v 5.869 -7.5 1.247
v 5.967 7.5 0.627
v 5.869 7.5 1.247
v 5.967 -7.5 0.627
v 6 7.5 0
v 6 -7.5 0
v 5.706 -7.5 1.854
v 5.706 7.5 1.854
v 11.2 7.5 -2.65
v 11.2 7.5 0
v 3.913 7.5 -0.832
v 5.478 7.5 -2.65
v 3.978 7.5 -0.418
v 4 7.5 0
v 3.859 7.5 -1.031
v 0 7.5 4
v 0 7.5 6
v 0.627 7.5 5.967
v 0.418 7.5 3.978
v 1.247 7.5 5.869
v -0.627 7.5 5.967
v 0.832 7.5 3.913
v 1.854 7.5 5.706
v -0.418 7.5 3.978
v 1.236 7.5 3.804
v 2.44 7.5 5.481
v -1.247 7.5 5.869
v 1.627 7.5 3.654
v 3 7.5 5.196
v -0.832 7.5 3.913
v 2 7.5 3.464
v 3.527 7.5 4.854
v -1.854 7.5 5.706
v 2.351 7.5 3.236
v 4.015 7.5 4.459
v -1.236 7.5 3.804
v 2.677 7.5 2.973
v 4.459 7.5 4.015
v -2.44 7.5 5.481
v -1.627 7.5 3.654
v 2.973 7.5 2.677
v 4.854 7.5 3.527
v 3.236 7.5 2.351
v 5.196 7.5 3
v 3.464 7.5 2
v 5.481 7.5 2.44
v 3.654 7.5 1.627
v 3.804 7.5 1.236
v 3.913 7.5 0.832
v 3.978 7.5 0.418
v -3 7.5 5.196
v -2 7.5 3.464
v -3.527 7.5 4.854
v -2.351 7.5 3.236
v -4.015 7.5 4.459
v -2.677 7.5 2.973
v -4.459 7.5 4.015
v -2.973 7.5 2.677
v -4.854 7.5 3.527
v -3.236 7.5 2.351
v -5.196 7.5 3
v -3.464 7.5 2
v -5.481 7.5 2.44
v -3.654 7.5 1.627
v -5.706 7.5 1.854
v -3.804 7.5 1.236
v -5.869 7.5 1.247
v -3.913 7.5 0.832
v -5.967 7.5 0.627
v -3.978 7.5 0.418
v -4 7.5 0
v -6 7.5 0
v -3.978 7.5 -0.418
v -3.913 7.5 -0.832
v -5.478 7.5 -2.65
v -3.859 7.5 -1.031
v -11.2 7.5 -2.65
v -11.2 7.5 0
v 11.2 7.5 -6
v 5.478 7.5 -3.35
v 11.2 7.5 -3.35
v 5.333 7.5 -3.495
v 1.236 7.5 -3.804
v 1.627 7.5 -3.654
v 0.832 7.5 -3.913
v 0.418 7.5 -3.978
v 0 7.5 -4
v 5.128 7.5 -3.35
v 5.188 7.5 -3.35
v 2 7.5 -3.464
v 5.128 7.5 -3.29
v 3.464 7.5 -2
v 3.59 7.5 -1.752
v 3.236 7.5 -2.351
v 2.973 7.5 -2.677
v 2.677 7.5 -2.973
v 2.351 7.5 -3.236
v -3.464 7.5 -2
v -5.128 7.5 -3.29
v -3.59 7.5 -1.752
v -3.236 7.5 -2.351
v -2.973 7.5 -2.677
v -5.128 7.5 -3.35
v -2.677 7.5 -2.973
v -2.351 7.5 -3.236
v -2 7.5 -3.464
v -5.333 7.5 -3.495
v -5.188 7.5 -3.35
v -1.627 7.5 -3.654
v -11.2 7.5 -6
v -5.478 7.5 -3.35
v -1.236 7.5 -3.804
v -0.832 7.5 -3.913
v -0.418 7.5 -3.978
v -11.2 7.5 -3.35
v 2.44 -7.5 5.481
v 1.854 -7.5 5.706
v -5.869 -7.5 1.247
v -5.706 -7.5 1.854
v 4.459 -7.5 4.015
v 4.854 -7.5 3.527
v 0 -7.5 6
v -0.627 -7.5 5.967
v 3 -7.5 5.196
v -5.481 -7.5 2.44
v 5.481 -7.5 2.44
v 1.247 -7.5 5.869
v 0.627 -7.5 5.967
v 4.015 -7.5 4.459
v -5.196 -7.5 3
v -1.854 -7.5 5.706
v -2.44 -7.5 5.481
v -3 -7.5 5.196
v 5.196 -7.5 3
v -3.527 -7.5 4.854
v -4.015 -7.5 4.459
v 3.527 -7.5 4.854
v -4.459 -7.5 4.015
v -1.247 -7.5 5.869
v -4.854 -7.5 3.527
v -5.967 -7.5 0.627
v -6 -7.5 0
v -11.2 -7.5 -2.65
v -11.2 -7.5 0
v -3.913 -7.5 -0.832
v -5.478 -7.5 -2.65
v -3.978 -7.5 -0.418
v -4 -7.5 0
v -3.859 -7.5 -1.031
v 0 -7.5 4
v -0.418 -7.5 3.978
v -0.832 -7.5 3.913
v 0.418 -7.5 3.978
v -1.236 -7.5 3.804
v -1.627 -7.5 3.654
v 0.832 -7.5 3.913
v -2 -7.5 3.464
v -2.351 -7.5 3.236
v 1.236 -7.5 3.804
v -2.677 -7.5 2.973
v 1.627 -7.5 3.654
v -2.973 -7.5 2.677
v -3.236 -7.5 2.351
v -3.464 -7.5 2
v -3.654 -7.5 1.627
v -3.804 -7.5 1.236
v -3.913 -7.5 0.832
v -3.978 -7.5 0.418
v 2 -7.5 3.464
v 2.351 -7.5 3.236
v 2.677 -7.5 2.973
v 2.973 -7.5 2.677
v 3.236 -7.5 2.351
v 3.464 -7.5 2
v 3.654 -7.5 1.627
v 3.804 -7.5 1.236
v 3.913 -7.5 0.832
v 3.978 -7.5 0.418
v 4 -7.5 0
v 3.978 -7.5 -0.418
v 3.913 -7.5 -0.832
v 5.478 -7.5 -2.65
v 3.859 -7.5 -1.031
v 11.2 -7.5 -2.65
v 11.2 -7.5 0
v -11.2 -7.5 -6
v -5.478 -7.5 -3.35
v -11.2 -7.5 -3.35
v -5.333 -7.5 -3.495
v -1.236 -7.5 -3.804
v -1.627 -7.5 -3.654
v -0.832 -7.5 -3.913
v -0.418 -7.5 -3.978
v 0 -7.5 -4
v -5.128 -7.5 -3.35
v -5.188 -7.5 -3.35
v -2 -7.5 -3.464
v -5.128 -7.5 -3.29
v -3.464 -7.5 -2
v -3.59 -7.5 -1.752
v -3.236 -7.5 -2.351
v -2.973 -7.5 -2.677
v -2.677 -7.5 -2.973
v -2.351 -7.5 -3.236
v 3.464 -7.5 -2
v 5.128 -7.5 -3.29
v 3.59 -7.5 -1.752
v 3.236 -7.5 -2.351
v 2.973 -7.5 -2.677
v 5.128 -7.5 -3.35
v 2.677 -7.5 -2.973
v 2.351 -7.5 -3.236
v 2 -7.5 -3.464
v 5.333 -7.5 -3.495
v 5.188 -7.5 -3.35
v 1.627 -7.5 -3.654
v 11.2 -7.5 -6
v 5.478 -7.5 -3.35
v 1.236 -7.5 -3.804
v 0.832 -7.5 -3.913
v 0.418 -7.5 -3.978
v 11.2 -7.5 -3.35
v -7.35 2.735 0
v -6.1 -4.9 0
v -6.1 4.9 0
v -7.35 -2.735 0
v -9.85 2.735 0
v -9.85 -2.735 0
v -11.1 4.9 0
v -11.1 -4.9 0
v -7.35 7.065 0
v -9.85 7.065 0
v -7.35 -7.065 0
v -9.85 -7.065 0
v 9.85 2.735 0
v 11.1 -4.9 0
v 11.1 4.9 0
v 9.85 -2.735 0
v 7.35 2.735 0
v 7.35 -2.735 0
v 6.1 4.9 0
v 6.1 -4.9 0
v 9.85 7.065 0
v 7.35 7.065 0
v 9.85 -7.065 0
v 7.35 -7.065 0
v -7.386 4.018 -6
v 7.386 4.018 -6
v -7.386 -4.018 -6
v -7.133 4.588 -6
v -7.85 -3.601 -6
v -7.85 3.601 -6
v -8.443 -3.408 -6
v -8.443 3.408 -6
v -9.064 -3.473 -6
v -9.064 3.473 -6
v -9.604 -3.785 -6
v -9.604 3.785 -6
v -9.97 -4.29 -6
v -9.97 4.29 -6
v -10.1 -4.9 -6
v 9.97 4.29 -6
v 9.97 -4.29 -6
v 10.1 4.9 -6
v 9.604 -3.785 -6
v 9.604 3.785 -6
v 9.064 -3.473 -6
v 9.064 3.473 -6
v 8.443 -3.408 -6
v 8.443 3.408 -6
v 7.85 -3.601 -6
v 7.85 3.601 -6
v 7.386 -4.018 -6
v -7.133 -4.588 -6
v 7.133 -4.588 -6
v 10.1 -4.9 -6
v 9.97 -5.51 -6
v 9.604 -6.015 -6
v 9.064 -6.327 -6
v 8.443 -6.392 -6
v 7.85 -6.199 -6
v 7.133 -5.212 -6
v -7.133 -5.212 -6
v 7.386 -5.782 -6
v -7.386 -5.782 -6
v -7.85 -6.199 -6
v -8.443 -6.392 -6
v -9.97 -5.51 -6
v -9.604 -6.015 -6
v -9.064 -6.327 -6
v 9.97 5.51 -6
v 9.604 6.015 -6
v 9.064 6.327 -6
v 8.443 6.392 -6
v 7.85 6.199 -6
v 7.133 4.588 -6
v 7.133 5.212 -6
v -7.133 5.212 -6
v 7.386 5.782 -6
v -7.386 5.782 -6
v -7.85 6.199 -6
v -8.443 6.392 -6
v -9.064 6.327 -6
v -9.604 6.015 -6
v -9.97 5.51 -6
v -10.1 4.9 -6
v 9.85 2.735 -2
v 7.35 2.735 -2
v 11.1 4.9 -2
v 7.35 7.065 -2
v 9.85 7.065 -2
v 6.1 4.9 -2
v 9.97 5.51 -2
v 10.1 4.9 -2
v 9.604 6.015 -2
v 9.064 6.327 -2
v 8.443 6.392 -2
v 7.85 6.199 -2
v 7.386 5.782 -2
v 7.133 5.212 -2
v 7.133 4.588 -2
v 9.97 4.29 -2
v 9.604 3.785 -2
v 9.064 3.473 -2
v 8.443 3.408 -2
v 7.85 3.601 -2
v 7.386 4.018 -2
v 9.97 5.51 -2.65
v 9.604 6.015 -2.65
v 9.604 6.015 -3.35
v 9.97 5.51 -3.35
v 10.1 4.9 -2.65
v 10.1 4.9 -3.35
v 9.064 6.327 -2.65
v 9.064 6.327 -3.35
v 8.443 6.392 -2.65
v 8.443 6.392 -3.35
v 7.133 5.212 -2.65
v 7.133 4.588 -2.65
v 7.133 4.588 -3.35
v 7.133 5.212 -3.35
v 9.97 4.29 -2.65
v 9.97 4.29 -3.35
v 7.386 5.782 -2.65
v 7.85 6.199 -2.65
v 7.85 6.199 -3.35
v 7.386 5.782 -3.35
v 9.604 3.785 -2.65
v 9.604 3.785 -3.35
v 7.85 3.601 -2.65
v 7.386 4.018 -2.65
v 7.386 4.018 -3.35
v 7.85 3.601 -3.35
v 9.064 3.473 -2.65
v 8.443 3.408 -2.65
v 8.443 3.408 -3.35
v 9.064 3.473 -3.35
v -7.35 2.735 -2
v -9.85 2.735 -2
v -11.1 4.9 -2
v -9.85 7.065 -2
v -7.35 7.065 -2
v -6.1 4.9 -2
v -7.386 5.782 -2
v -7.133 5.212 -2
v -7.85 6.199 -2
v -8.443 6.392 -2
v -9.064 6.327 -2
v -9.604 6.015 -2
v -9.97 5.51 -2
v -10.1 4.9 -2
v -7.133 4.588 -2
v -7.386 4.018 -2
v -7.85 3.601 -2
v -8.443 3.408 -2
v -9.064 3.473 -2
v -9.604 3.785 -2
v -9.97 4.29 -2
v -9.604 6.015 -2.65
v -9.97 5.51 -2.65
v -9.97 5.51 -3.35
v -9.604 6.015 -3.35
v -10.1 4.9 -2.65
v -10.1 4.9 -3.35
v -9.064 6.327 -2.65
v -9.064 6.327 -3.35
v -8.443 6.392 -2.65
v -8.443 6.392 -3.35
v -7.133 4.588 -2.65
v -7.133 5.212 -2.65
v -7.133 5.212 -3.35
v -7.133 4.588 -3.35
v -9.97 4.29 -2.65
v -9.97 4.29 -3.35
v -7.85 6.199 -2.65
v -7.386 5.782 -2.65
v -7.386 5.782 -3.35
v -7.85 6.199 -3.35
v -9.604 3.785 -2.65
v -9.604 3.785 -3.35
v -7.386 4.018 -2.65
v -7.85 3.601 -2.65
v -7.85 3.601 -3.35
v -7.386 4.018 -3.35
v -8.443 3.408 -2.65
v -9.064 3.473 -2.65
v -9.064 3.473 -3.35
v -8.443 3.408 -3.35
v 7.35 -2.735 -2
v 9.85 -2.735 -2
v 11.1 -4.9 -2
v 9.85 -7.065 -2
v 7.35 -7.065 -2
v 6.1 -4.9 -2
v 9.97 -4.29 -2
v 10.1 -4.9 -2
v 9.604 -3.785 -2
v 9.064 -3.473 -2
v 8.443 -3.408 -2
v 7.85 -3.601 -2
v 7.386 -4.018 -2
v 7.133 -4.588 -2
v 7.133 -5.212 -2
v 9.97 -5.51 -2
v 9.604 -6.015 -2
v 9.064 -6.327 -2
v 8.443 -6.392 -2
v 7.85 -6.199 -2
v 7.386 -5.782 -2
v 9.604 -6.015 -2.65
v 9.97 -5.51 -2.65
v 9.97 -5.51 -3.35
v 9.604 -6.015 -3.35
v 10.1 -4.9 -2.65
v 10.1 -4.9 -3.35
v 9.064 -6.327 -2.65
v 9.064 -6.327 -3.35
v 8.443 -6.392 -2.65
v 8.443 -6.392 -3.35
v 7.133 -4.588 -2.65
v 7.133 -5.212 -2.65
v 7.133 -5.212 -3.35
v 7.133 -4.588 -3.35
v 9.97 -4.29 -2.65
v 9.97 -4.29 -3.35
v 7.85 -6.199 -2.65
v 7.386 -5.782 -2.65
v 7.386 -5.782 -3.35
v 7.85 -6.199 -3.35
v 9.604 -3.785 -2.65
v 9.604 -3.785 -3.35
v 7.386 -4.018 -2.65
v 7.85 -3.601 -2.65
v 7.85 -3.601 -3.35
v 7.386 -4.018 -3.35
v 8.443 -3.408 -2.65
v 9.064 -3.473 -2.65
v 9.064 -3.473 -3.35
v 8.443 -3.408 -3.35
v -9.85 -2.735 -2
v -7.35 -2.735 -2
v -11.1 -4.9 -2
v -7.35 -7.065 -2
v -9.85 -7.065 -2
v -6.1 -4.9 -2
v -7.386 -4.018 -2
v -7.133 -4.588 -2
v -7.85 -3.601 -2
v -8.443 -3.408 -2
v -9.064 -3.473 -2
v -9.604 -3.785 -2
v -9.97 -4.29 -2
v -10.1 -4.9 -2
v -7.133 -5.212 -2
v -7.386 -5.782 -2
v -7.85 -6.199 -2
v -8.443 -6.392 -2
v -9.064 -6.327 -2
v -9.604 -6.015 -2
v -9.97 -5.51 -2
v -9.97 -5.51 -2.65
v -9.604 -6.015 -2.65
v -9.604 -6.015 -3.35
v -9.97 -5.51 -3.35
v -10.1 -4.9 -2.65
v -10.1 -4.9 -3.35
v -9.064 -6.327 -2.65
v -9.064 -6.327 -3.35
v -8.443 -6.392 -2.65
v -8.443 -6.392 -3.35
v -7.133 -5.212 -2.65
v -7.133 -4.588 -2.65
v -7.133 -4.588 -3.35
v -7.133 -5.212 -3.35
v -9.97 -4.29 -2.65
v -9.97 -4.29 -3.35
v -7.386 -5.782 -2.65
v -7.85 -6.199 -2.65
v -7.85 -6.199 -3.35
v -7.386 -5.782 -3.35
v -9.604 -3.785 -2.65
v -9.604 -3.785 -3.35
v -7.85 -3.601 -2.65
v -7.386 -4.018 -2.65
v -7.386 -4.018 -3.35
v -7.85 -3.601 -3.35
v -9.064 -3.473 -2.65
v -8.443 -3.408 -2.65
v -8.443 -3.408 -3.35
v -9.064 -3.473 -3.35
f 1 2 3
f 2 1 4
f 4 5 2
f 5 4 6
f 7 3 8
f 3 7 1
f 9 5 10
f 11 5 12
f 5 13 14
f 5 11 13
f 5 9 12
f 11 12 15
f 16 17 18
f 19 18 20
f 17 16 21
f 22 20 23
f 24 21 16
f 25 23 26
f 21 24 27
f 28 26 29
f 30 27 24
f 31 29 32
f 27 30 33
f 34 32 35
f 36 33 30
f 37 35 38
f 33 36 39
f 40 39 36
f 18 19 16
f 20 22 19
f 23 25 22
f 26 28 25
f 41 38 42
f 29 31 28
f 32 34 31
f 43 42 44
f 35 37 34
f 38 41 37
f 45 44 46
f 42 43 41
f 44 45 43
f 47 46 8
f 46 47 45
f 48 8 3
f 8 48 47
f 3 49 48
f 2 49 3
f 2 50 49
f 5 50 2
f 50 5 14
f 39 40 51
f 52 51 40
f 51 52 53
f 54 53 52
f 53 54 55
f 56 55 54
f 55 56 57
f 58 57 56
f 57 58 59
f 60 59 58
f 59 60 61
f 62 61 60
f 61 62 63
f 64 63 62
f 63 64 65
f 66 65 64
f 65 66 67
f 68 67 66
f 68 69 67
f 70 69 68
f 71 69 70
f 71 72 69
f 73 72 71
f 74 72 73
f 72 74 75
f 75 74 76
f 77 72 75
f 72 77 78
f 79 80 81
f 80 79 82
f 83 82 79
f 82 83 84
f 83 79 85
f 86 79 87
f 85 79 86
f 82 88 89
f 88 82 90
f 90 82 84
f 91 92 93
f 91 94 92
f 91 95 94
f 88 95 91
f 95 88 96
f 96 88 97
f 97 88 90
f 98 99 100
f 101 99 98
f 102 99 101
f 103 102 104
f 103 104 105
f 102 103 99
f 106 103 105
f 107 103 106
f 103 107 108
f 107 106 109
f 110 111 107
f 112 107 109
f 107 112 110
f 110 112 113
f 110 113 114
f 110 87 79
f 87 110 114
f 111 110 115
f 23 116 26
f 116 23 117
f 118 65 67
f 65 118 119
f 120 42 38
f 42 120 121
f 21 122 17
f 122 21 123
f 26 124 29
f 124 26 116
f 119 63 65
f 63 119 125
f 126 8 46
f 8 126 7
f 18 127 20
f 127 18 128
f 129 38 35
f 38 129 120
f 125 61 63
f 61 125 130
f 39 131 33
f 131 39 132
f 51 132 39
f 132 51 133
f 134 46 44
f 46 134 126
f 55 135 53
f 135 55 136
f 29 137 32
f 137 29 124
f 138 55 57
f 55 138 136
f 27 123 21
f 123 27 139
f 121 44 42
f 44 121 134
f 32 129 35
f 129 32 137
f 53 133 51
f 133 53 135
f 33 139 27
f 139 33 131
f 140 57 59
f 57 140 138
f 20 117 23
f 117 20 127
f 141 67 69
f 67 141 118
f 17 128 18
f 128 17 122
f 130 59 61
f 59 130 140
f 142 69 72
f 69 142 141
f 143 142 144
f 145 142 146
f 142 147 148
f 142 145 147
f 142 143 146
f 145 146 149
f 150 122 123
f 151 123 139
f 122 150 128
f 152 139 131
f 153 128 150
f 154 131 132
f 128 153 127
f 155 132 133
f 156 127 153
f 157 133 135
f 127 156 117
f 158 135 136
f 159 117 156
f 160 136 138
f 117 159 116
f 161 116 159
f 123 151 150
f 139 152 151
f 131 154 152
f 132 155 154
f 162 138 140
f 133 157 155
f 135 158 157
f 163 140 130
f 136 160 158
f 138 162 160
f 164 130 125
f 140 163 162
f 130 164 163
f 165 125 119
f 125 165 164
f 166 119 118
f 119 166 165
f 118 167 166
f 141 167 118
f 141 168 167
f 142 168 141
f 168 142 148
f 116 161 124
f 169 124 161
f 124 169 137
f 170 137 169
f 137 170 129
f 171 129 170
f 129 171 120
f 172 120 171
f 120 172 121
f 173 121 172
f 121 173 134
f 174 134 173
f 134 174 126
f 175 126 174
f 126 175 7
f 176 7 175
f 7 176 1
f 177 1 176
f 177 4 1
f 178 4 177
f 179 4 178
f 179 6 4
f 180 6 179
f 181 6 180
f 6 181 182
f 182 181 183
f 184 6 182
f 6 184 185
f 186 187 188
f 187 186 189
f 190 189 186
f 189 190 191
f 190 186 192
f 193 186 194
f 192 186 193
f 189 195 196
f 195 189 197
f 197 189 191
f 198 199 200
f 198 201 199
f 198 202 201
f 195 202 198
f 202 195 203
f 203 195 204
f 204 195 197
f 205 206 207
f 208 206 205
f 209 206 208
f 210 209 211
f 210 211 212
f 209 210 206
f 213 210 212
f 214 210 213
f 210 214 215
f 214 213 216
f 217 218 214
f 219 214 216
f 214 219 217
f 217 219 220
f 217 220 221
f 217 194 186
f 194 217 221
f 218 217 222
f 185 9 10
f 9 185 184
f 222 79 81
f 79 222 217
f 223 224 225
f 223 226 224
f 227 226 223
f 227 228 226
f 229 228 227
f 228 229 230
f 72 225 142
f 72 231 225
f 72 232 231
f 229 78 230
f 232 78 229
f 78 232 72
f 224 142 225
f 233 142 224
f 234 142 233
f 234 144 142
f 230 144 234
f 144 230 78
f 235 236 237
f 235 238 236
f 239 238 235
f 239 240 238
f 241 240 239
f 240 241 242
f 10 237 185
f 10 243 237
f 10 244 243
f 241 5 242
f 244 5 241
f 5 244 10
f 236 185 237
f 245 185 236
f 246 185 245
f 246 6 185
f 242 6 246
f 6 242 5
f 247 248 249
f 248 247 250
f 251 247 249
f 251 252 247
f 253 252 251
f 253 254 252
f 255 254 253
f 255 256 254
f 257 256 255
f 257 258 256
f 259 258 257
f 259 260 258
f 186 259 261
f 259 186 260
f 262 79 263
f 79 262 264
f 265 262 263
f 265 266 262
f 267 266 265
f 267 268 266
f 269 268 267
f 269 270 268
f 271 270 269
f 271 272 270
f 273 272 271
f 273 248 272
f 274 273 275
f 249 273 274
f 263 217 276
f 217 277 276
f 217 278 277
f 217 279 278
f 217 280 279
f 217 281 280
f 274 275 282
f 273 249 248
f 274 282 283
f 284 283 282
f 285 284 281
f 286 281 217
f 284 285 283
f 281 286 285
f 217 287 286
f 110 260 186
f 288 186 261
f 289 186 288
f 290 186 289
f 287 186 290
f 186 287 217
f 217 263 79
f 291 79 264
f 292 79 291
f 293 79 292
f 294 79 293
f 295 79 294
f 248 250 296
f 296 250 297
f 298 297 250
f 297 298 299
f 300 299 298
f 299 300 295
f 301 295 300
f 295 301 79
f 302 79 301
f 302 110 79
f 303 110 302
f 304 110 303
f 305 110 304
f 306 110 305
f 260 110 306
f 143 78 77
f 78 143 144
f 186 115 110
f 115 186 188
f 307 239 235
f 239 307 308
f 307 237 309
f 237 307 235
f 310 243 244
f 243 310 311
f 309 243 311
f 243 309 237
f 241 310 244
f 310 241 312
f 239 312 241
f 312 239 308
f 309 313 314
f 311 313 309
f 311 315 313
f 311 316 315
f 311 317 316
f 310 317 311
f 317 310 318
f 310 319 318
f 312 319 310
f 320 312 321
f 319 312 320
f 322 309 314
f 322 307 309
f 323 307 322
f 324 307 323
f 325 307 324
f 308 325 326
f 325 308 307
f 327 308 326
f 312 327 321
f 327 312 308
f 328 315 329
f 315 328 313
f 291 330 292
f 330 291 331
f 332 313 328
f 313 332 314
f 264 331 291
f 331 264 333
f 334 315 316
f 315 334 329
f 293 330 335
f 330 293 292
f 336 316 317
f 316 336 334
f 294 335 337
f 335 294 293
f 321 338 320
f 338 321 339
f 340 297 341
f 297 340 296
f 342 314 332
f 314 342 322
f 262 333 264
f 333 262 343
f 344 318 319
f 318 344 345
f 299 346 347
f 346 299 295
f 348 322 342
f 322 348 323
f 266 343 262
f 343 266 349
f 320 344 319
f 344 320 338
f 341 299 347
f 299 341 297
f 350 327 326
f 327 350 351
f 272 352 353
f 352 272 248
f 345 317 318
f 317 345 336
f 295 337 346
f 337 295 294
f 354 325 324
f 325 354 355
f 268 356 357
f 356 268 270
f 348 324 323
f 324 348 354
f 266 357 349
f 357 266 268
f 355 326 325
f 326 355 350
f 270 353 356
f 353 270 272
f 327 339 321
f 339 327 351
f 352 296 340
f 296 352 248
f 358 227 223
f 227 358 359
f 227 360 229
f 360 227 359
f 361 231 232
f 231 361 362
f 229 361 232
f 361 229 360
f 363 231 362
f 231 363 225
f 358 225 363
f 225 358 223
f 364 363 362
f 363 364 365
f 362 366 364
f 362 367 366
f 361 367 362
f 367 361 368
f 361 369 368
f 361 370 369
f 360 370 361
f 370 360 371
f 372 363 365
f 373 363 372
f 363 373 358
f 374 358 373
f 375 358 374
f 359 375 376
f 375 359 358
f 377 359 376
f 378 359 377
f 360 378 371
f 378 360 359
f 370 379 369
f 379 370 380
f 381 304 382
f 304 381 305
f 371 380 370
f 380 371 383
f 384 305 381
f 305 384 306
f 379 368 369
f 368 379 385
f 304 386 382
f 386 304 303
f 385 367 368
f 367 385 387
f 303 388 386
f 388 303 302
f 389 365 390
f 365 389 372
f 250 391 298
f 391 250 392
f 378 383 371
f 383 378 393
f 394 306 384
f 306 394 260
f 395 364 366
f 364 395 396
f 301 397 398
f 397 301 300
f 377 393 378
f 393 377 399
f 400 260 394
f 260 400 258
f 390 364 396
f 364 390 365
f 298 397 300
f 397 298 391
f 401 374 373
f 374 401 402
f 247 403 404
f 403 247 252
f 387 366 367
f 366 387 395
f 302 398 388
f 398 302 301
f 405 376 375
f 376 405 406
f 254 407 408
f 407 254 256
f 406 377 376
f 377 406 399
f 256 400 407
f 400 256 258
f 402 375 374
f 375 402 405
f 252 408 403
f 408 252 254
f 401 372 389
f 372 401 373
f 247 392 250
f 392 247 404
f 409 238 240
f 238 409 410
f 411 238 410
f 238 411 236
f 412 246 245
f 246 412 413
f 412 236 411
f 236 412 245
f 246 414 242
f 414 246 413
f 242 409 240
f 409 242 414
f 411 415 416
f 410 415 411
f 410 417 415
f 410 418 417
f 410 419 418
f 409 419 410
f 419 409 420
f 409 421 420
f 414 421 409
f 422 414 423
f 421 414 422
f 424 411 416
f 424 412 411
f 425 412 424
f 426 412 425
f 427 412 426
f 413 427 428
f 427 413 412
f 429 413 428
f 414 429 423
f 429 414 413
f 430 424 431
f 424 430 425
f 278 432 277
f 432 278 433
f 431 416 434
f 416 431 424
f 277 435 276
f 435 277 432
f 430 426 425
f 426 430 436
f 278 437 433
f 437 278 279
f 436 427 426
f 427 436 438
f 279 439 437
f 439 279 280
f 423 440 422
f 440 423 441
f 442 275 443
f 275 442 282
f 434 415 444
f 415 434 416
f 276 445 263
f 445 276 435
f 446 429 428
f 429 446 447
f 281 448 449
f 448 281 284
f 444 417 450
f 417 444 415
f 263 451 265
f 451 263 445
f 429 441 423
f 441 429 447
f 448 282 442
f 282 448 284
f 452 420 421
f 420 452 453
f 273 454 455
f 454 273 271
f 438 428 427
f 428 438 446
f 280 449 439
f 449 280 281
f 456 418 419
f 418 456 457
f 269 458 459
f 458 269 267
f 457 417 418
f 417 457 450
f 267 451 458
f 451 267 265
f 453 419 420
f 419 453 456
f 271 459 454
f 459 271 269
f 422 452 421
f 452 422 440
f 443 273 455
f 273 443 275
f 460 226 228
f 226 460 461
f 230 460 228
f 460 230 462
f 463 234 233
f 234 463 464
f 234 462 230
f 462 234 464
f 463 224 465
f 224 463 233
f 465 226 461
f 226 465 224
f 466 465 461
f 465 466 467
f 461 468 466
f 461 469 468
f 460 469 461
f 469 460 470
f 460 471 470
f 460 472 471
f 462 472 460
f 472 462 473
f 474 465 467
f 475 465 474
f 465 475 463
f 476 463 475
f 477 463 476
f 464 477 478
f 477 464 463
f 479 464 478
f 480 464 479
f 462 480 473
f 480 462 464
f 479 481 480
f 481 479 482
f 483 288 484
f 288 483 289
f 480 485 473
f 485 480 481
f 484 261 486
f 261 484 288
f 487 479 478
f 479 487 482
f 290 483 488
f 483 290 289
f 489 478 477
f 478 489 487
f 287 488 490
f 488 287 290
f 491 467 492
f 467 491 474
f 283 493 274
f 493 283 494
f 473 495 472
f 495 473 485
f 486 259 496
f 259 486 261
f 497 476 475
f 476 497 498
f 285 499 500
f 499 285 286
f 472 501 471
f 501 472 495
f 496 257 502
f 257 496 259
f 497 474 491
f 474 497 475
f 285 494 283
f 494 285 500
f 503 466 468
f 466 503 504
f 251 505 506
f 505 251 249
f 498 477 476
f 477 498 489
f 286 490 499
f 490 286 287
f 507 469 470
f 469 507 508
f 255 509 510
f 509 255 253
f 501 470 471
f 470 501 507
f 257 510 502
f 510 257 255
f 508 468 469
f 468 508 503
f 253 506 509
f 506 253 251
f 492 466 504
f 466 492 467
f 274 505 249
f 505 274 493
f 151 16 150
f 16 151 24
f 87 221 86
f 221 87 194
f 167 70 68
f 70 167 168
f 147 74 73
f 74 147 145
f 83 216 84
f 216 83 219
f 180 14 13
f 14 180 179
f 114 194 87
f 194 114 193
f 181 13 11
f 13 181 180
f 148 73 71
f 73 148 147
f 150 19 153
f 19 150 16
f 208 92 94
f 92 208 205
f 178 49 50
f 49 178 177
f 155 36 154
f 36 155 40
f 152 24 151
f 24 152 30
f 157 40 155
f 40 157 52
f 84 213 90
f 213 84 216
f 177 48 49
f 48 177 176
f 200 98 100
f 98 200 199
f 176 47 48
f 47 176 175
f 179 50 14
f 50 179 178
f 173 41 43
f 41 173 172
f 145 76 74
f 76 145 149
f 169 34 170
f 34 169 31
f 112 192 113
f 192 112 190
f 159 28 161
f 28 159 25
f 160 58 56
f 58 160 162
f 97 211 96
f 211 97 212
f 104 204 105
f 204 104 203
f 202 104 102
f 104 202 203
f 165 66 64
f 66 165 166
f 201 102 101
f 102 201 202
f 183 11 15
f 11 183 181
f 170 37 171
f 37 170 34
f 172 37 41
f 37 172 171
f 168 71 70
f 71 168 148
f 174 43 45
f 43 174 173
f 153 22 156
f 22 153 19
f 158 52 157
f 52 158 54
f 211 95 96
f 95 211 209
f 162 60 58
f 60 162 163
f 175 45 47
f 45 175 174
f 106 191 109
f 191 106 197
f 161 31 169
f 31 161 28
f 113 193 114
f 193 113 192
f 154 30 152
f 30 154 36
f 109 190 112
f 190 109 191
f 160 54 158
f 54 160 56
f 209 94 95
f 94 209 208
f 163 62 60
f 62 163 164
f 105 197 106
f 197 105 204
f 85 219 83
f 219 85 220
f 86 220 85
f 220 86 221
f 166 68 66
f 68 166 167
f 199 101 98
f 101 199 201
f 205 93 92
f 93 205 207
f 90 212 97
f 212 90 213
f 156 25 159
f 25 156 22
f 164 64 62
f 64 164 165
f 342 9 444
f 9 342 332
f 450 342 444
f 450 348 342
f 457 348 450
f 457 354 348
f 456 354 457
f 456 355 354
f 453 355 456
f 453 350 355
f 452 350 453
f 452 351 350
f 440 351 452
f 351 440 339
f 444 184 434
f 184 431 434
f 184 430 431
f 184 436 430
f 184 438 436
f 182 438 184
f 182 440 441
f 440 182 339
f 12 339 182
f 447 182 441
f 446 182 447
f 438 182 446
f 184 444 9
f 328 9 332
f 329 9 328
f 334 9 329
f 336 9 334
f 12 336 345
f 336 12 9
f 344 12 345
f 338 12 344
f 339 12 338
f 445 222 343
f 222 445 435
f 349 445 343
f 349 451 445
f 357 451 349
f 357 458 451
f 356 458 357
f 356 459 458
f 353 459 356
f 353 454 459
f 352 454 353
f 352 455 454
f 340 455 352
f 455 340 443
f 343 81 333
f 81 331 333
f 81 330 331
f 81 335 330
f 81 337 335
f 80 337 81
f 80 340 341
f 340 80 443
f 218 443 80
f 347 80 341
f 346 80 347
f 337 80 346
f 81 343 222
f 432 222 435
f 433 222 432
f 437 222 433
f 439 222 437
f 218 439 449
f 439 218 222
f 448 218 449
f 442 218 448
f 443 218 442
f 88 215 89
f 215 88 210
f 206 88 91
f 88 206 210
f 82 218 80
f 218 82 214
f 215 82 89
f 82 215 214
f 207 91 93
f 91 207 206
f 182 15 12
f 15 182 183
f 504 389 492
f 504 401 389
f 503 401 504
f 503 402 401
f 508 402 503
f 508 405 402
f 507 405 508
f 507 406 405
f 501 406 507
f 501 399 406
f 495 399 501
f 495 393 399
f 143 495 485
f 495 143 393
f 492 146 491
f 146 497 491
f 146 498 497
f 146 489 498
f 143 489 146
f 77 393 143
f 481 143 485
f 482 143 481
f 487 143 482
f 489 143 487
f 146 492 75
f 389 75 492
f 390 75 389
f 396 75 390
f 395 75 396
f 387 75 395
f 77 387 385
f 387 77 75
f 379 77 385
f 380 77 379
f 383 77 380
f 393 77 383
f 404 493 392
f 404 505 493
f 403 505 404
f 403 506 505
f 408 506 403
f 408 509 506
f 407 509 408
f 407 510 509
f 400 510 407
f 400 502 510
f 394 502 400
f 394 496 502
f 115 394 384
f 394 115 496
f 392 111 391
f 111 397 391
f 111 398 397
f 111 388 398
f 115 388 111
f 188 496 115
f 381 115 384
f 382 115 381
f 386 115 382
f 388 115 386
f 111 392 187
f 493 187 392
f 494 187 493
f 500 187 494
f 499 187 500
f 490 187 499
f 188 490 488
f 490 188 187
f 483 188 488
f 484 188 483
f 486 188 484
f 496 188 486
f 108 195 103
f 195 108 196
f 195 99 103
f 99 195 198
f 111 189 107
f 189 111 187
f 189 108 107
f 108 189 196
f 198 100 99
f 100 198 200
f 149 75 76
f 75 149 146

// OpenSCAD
p = 15;

r = 4;
b = 2;
b2 = 1.1;

f=1.5;
fh = 2.5;
c = .7;

module r(x,y,z){
	rotate([x,y,z]) child();
}

module t(x,y,z){
	translate([x,y,z]) child();
}

module f(){
$fn= 15;
t(r+b+f+b2,p/2 - f - b2,0)
union(){
t(0,0,b - 2)cylinder(r = fh, h=100, $fn=6);
cylinder(r=f, h=100, center=true);
}
}

module furos(){
f();
mirror([1,0,0]) f();

mirror([0,1,0])
union(){
	f();
	mirror([1,0,0]) f();
}
}

module spacer(){
t(r + r*sin(45) - c -1,0,0)
union(){
t(0,-(p+1)/2,-a/4 + -c/2)cube([l2/2,p+1,c], center=false);
t(c,-(p+1)/2,-a/4 + -c/2 + c/2) r(0,45 + 180,0) cube([r,p+1,c], center=false);
}
}


l = 2*r + 2*b;
a = 2*r + 2*b;
l2 = l + (b2*2 + f*2)*2;

$fn = 60;

difference(){
t(0,0,-b)
difference(){
union(){
/*
t(0,0,b)
	cube([l,p,a], center=true);
*/
t(0,0,b)
r(90,0,0)
	cylinder(r=r + b, h=p, center=true);


t(0,0,-a/4 + b)
	cube([l2,p,a/2], center=true);


}

union(){
t(0,0,b)
r(90,0,0)
	cylinder(r=r, h=p+1, center=true);
furos();
}
}

spacer();
mirror([1,0,0]) spacer();
}




//cube([l,p,a], center=true);
